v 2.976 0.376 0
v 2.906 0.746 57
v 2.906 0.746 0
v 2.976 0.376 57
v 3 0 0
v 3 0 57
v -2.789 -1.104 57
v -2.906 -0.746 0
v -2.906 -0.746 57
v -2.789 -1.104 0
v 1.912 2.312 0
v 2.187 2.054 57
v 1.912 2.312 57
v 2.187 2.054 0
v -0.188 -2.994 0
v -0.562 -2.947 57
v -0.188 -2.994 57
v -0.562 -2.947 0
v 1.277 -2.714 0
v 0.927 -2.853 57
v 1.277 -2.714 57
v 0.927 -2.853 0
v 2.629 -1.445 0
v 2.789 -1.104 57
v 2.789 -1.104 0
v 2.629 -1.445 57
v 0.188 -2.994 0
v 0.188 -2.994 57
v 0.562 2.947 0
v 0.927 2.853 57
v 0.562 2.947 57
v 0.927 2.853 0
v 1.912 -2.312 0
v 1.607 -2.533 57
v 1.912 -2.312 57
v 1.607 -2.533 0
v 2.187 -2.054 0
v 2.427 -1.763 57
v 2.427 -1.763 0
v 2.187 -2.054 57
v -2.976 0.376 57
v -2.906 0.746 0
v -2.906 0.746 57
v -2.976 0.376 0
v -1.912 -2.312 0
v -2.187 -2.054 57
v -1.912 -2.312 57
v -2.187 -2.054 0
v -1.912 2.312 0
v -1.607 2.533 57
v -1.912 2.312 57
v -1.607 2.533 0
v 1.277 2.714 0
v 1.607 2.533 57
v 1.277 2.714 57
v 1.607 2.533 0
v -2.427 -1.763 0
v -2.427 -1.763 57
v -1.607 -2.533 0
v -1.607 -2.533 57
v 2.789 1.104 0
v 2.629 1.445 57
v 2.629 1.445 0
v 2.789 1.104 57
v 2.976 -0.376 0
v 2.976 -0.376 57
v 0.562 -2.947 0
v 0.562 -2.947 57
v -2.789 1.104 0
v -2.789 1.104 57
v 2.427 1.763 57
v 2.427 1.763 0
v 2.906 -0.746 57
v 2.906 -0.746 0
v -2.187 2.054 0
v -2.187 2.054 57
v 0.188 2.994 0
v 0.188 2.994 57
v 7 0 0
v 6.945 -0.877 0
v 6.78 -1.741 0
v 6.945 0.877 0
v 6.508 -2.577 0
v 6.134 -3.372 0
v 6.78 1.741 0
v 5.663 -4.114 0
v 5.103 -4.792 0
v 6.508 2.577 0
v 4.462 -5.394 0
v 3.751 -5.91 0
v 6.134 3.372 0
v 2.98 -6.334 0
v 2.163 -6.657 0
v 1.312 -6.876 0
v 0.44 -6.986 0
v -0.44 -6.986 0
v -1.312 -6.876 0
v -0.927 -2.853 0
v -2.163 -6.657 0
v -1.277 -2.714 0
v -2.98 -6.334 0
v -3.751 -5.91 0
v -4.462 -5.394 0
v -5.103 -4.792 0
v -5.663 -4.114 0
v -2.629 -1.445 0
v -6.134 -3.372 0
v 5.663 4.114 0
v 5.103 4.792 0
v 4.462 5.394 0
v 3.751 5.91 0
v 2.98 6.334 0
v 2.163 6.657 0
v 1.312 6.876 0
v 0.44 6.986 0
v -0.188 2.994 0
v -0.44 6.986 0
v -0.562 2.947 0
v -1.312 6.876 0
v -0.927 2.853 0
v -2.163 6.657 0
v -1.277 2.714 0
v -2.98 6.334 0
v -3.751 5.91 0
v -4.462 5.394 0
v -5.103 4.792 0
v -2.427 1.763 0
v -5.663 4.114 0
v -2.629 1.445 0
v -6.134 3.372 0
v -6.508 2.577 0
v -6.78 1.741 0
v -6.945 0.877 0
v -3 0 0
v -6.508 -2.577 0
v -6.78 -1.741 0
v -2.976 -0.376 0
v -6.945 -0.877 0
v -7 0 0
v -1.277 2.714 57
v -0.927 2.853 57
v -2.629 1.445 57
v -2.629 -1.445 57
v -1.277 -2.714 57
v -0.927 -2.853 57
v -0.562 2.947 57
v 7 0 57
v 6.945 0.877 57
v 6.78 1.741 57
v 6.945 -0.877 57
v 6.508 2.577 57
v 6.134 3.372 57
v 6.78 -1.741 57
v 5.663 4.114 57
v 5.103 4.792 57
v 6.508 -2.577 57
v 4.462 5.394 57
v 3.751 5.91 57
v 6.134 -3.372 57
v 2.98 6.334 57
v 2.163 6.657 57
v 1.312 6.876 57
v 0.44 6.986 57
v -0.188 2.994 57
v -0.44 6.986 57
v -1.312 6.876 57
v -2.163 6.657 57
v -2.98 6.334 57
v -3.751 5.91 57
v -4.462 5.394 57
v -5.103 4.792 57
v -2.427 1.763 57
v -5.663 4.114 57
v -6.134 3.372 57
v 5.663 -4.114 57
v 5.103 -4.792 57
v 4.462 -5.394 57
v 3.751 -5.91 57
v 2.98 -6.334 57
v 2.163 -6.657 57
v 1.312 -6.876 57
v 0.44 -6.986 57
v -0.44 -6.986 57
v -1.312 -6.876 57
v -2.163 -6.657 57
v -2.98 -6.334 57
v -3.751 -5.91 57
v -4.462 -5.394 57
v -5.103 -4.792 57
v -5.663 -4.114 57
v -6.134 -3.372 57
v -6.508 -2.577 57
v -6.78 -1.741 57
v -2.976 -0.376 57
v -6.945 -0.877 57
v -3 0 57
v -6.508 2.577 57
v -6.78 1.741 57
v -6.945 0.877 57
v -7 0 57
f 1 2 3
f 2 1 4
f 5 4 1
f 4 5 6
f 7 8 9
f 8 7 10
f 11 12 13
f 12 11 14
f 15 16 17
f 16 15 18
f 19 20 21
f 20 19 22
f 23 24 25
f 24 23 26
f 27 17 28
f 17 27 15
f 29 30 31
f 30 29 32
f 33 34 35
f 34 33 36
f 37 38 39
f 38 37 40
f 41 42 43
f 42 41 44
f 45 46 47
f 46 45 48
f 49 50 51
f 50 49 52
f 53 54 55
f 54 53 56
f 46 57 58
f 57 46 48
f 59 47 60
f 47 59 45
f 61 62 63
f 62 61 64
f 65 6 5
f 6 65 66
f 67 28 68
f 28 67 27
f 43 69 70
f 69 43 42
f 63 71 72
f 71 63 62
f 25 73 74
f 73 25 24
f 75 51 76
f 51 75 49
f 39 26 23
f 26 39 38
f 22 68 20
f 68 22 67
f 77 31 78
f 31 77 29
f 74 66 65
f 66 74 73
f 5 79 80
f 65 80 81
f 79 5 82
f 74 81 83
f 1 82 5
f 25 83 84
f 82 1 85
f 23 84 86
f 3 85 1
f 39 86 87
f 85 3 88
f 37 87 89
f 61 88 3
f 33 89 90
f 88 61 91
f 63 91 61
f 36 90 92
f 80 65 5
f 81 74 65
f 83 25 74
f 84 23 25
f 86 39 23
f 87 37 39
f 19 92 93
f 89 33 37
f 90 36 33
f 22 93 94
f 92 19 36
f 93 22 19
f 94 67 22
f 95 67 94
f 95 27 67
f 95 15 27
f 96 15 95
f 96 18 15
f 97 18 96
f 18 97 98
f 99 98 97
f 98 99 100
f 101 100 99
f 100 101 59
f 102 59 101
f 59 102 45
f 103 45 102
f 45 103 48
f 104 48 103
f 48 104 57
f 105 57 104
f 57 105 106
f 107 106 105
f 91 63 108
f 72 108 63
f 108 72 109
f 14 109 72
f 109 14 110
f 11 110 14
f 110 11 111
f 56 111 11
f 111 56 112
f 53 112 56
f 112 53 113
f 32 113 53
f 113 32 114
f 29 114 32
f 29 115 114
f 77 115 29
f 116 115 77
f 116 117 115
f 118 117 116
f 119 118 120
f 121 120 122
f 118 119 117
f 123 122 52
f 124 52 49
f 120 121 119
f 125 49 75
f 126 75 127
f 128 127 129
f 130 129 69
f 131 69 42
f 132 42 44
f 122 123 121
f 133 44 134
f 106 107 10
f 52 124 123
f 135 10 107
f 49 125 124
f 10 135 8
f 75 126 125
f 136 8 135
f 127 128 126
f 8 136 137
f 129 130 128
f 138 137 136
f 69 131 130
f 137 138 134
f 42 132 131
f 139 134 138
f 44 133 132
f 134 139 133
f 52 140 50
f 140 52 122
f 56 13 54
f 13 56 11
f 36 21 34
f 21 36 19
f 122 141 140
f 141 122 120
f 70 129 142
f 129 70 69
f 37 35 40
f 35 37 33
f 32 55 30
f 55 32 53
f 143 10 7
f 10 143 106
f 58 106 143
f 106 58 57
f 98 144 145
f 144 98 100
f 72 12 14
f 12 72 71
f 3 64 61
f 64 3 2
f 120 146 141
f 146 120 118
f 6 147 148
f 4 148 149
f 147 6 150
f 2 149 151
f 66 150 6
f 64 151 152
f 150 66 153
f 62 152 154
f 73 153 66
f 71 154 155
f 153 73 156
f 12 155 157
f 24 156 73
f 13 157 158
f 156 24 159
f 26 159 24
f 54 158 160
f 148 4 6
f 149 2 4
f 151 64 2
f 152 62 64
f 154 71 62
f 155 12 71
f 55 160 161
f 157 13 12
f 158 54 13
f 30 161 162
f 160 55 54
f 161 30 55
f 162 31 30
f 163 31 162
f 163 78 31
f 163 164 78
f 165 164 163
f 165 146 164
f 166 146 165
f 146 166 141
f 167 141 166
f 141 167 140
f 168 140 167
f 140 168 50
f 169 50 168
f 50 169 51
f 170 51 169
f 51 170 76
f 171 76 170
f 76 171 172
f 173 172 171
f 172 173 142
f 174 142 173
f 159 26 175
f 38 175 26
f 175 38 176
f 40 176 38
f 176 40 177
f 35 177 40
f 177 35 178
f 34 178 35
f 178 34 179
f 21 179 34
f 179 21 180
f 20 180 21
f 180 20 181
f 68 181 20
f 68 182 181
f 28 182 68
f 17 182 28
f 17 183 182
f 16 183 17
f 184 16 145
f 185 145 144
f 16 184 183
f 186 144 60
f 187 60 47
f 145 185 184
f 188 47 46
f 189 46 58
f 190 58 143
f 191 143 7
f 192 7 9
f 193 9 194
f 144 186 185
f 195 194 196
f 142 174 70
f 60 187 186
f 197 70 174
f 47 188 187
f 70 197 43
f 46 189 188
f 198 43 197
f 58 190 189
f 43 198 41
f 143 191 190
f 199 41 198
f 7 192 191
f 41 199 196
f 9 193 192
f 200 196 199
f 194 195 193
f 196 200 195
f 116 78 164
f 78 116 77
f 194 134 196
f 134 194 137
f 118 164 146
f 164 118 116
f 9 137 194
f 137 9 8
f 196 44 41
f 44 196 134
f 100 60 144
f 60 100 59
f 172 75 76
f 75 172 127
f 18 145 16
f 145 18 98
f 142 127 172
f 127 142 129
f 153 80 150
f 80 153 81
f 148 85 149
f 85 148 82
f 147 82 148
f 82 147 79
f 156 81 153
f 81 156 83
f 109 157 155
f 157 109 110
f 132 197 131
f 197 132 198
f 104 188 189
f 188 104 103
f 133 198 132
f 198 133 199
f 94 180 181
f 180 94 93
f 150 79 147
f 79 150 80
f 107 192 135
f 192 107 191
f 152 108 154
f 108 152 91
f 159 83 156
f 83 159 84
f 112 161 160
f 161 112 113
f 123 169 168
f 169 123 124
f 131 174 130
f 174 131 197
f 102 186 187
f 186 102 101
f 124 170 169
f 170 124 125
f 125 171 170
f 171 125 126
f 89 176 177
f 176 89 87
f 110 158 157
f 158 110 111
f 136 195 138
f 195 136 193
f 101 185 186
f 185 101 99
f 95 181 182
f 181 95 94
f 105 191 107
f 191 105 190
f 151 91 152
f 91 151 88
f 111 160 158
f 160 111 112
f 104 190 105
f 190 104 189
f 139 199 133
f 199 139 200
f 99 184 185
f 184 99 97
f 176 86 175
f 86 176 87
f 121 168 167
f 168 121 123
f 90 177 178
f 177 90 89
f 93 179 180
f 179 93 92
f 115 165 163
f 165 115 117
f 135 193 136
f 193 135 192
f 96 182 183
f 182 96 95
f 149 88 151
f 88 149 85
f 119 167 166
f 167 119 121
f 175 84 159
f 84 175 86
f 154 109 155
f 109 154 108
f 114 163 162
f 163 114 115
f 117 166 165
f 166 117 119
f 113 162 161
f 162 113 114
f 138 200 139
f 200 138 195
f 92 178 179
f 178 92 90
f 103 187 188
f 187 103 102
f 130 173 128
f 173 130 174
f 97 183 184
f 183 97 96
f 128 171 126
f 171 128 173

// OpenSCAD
$fn = 50;


difference() {
	union() {
		cylinder(h = 57, r = 7.0000000000);
	}
	union() {
		cylinder(h = 57, r = 3.0000000000);
		cylinder(h = 57, r = 1.5000000000);
		cylinder(h = 57, r = 1.5000000000);
		cylinder(h = 57, r = 1.5000000000);
	}
}
